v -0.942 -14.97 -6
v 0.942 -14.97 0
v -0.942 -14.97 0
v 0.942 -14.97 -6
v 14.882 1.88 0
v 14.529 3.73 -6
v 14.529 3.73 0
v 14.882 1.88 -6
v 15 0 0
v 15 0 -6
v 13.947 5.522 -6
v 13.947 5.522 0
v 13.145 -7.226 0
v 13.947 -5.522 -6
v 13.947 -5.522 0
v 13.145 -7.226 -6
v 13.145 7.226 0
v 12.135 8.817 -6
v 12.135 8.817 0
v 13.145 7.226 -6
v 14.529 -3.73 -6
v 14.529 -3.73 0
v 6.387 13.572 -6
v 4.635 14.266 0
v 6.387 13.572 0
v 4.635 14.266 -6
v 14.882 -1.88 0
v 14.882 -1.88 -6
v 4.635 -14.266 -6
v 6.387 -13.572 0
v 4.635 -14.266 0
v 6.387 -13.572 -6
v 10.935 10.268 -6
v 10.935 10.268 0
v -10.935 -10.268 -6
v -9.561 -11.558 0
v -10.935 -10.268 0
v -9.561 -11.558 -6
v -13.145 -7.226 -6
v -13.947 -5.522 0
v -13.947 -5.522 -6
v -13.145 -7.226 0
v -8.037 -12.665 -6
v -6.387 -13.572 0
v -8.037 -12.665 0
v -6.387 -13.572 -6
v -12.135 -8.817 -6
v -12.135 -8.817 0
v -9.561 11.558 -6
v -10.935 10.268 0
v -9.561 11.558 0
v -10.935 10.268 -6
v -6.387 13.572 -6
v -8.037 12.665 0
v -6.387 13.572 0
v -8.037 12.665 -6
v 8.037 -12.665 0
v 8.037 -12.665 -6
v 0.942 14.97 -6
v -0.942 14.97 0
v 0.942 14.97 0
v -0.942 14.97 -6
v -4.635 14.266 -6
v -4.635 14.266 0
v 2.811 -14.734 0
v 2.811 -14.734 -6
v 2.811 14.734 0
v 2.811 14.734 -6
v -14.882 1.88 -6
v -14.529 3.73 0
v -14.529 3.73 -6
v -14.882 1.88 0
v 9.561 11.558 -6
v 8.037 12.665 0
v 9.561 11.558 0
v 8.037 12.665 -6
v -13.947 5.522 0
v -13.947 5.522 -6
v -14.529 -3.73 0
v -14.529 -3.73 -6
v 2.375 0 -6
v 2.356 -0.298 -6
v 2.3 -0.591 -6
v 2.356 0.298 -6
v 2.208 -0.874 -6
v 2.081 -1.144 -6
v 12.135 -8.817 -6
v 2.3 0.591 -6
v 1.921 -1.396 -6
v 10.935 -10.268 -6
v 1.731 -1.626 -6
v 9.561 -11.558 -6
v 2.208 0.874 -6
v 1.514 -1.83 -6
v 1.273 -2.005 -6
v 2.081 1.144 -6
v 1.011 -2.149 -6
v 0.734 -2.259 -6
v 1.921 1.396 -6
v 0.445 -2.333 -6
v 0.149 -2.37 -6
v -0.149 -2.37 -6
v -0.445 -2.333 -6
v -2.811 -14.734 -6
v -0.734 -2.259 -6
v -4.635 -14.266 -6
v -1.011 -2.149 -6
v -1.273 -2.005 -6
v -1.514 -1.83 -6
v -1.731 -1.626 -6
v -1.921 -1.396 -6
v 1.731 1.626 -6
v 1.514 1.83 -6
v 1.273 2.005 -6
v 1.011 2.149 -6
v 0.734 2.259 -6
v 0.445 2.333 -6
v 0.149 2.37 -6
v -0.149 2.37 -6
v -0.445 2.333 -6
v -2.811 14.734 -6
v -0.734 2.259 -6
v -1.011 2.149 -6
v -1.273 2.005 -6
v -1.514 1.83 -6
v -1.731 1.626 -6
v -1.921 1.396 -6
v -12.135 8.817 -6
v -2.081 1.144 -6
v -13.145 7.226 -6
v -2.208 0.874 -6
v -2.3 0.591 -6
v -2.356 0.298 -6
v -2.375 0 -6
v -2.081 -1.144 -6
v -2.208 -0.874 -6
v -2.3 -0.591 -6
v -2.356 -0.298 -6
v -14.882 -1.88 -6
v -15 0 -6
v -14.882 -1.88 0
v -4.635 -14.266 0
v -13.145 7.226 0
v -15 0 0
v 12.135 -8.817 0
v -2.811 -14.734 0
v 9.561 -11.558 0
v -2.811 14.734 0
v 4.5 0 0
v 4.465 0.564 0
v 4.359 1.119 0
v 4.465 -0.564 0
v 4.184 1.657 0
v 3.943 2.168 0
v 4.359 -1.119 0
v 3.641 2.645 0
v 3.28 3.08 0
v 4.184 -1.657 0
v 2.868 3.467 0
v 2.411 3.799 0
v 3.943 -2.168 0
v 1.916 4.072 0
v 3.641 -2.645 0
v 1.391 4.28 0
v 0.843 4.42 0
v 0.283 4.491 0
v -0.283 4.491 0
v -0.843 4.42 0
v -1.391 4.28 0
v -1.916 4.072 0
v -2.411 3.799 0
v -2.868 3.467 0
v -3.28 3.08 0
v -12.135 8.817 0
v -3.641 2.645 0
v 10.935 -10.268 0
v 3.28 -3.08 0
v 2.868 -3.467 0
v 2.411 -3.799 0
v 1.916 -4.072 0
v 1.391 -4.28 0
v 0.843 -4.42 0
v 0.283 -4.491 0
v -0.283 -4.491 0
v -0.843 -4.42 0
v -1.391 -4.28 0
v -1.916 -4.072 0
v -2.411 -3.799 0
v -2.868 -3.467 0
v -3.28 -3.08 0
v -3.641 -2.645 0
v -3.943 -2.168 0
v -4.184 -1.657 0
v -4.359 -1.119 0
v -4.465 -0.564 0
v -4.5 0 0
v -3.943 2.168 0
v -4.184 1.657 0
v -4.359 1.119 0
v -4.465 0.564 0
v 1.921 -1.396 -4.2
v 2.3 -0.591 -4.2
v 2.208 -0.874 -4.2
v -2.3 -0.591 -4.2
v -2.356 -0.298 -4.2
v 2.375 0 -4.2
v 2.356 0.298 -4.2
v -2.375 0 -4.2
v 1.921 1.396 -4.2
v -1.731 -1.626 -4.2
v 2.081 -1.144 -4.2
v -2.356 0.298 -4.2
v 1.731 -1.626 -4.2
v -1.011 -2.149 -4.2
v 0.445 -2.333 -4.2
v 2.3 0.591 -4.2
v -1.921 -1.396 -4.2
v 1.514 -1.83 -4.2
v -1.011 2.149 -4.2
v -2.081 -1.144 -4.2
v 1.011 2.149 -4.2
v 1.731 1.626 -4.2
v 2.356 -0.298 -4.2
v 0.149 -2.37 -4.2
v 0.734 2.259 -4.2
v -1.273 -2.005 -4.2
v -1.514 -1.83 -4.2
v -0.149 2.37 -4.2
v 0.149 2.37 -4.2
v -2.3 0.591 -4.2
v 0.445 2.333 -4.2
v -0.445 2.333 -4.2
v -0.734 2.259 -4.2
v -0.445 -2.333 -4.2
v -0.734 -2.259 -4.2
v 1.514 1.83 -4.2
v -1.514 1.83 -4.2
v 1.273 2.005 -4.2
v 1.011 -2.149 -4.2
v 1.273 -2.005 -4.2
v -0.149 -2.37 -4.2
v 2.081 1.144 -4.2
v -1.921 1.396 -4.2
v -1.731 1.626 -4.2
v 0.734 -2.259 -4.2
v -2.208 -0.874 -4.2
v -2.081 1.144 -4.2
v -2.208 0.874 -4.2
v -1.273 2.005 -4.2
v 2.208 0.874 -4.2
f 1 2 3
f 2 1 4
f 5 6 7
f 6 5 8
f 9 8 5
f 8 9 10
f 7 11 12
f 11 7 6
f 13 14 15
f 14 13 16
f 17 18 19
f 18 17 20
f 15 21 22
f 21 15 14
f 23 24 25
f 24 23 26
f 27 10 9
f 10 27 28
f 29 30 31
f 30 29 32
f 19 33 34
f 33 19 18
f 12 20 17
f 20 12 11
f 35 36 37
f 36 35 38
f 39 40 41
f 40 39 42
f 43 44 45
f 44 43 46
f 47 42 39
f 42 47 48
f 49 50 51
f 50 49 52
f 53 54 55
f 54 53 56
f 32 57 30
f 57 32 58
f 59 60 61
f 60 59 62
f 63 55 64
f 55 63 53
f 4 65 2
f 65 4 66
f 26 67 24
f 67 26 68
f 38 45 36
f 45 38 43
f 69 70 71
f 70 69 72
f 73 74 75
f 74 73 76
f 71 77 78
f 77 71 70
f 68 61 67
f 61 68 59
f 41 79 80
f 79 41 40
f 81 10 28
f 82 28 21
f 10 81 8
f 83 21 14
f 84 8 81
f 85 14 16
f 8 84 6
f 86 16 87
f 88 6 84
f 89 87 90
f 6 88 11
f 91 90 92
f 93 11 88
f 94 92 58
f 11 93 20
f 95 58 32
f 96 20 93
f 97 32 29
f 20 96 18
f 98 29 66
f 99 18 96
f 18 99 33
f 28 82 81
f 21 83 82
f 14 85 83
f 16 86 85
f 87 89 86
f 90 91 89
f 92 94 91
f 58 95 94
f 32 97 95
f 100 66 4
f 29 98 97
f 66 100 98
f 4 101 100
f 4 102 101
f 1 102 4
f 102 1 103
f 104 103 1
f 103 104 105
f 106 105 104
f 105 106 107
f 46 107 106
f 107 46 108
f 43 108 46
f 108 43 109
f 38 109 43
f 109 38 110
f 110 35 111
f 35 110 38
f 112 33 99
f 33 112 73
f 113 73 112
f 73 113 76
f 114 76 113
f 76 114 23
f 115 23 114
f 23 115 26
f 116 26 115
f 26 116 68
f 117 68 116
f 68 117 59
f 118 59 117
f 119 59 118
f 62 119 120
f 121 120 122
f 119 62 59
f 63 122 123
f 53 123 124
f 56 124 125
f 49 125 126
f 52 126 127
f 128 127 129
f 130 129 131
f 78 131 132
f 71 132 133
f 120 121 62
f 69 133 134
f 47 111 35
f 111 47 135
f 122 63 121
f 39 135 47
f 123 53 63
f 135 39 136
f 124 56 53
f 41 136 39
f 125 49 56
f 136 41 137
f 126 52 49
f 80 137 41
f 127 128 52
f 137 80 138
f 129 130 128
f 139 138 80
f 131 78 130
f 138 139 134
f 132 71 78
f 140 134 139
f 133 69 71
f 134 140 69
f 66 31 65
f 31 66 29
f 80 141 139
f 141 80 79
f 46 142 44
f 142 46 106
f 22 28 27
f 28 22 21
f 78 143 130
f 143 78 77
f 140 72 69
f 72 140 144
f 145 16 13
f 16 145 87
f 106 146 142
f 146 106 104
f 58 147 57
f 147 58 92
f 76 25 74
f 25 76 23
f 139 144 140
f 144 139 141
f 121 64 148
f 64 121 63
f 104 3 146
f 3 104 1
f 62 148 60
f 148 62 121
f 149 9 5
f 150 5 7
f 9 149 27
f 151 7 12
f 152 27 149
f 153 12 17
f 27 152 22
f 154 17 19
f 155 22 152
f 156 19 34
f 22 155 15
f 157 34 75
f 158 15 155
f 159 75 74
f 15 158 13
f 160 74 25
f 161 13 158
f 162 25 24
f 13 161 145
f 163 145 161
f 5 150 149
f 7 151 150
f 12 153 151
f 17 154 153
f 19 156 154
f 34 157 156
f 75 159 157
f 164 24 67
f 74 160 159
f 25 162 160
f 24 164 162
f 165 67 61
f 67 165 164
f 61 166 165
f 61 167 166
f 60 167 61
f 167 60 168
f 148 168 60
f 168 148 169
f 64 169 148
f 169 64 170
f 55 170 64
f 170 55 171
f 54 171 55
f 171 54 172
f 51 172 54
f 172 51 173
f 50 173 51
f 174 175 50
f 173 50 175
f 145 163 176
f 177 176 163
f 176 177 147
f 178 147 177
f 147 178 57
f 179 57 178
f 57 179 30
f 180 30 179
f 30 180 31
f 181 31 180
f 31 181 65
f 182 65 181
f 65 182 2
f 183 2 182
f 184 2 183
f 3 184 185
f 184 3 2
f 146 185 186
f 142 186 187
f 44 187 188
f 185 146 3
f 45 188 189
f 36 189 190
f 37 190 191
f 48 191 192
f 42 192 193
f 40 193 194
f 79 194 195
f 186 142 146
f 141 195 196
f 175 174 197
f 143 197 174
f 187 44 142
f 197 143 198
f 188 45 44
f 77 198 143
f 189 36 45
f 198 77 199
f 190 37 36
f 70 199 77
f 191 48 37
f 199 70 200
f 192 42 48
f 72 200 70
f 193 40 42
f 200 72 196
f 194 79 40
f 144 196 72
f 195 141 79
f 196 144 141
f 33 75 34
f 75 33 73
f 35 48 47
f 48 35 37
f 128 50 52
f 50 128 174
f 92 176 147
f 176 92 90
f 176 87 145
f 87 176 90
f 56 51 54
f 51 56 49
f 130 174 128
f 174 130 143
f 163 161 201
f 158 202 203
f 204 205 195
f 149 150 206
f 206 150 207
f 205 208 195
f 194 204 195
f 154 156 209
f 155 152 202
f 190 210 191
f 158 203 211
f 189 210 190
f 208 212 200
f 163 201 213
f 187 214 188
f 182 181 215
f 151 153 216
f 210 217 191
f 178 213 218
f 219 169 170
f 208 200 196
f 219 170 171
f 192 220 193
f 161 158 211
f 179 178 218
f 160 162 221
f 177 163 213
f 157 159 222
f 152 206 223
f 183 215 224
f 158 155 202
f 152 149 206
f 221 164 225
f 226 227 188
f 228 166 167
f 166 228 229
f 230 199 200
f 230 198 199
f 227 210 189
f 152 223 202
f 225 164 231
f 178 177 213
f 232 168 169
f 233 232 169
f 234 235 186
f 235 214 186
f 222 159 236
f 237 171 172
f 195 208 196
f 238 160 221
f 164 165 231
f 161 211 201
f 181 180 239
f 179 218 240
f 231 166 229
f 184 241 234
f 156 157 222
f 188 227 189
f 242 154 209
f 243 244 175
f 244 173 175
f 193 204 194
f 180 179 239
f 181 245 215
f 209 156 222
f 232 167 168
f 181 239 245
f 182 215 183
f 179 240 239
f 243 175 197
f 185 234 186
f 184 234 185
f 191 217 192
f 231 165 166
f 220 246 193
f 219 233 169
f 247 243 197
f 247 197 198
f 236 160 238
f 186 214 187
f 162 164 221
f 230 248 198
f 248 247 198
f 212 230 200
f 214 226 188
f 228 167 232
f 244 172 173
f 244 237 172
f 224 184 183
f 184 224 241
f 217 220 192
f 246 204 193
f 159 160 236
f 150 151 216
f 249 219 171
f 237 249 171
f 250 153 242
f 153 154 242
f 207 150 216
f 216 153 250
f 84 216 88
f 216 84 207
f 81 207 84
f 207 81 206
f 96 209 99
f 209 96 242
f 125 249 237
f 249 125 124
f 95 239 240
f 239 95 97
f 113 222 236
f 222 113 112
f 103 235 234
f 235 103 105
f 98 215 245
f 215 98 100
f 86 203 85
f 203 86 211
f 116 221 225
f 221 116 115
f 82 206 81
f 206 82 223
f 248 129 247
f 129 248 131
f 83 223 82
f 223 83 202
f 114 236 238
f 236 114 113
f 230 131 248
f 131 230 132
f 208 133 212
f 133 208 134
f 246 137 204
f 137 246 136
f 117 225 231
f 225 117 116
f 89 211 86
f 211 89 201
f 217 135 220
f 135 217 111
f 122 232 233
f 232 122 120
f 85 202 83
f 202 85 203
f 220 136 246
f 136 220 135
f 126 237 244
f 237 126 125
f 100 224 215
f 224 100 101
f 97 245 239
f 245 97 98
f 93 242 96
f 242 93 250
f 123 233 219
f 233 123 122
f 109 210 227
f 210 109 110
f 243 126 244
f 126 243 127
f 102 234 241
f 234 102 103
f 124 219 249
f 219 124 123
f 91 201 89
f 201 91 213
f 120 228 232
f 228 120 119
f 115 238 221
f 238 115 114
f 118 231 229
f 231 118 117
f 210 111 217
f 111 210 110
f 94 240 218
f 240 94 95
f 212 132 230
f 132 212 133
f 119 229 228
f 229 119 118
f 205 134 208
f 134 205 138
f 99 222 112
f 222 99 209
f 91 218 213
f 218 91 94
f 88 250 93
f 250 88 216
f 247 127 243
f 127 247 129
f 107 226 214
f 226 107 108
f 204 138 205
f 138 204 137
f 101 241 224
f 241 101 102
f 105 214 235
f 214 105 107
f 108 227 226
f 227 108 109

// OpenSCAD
$fn = 50;


difference() {
	union() {
		translate(v = [0, 0, -6.0000000000]) {
			cylinder(h = 6, r = 15.0000000000);
		}
		translate(v = [0, 0, -6.0000000000]) {
			cylinder(h = 6, r = 2.8750000000);
		}
	}
	union() {
		translate(v = [0, 0, 0]) {
			rotate(a = [0, 0, 0]) {
				difference() {
					union() {
						translate(v = [0, 0, -6.0000000000]) {
							cylinder(h = 6, r = 2.2500000000);
						}
						translate(v = [0, 0, -4.2000000000]) {
							cylinder(h = 4.2000000000, r1 = 2.3750000000, r2 = 4.5000000000);
						}
						translate(v = [0, 0, -6.0000000000]) {
							cylinder(h = 6, r = 2.3750000000);
						}
						translate(v = [0, 0, -6.0000000000]) {
							cylinder(h = 6, r = 2.2500000000);
						}
					}
					union();
				}
			}
		}
	}
}
